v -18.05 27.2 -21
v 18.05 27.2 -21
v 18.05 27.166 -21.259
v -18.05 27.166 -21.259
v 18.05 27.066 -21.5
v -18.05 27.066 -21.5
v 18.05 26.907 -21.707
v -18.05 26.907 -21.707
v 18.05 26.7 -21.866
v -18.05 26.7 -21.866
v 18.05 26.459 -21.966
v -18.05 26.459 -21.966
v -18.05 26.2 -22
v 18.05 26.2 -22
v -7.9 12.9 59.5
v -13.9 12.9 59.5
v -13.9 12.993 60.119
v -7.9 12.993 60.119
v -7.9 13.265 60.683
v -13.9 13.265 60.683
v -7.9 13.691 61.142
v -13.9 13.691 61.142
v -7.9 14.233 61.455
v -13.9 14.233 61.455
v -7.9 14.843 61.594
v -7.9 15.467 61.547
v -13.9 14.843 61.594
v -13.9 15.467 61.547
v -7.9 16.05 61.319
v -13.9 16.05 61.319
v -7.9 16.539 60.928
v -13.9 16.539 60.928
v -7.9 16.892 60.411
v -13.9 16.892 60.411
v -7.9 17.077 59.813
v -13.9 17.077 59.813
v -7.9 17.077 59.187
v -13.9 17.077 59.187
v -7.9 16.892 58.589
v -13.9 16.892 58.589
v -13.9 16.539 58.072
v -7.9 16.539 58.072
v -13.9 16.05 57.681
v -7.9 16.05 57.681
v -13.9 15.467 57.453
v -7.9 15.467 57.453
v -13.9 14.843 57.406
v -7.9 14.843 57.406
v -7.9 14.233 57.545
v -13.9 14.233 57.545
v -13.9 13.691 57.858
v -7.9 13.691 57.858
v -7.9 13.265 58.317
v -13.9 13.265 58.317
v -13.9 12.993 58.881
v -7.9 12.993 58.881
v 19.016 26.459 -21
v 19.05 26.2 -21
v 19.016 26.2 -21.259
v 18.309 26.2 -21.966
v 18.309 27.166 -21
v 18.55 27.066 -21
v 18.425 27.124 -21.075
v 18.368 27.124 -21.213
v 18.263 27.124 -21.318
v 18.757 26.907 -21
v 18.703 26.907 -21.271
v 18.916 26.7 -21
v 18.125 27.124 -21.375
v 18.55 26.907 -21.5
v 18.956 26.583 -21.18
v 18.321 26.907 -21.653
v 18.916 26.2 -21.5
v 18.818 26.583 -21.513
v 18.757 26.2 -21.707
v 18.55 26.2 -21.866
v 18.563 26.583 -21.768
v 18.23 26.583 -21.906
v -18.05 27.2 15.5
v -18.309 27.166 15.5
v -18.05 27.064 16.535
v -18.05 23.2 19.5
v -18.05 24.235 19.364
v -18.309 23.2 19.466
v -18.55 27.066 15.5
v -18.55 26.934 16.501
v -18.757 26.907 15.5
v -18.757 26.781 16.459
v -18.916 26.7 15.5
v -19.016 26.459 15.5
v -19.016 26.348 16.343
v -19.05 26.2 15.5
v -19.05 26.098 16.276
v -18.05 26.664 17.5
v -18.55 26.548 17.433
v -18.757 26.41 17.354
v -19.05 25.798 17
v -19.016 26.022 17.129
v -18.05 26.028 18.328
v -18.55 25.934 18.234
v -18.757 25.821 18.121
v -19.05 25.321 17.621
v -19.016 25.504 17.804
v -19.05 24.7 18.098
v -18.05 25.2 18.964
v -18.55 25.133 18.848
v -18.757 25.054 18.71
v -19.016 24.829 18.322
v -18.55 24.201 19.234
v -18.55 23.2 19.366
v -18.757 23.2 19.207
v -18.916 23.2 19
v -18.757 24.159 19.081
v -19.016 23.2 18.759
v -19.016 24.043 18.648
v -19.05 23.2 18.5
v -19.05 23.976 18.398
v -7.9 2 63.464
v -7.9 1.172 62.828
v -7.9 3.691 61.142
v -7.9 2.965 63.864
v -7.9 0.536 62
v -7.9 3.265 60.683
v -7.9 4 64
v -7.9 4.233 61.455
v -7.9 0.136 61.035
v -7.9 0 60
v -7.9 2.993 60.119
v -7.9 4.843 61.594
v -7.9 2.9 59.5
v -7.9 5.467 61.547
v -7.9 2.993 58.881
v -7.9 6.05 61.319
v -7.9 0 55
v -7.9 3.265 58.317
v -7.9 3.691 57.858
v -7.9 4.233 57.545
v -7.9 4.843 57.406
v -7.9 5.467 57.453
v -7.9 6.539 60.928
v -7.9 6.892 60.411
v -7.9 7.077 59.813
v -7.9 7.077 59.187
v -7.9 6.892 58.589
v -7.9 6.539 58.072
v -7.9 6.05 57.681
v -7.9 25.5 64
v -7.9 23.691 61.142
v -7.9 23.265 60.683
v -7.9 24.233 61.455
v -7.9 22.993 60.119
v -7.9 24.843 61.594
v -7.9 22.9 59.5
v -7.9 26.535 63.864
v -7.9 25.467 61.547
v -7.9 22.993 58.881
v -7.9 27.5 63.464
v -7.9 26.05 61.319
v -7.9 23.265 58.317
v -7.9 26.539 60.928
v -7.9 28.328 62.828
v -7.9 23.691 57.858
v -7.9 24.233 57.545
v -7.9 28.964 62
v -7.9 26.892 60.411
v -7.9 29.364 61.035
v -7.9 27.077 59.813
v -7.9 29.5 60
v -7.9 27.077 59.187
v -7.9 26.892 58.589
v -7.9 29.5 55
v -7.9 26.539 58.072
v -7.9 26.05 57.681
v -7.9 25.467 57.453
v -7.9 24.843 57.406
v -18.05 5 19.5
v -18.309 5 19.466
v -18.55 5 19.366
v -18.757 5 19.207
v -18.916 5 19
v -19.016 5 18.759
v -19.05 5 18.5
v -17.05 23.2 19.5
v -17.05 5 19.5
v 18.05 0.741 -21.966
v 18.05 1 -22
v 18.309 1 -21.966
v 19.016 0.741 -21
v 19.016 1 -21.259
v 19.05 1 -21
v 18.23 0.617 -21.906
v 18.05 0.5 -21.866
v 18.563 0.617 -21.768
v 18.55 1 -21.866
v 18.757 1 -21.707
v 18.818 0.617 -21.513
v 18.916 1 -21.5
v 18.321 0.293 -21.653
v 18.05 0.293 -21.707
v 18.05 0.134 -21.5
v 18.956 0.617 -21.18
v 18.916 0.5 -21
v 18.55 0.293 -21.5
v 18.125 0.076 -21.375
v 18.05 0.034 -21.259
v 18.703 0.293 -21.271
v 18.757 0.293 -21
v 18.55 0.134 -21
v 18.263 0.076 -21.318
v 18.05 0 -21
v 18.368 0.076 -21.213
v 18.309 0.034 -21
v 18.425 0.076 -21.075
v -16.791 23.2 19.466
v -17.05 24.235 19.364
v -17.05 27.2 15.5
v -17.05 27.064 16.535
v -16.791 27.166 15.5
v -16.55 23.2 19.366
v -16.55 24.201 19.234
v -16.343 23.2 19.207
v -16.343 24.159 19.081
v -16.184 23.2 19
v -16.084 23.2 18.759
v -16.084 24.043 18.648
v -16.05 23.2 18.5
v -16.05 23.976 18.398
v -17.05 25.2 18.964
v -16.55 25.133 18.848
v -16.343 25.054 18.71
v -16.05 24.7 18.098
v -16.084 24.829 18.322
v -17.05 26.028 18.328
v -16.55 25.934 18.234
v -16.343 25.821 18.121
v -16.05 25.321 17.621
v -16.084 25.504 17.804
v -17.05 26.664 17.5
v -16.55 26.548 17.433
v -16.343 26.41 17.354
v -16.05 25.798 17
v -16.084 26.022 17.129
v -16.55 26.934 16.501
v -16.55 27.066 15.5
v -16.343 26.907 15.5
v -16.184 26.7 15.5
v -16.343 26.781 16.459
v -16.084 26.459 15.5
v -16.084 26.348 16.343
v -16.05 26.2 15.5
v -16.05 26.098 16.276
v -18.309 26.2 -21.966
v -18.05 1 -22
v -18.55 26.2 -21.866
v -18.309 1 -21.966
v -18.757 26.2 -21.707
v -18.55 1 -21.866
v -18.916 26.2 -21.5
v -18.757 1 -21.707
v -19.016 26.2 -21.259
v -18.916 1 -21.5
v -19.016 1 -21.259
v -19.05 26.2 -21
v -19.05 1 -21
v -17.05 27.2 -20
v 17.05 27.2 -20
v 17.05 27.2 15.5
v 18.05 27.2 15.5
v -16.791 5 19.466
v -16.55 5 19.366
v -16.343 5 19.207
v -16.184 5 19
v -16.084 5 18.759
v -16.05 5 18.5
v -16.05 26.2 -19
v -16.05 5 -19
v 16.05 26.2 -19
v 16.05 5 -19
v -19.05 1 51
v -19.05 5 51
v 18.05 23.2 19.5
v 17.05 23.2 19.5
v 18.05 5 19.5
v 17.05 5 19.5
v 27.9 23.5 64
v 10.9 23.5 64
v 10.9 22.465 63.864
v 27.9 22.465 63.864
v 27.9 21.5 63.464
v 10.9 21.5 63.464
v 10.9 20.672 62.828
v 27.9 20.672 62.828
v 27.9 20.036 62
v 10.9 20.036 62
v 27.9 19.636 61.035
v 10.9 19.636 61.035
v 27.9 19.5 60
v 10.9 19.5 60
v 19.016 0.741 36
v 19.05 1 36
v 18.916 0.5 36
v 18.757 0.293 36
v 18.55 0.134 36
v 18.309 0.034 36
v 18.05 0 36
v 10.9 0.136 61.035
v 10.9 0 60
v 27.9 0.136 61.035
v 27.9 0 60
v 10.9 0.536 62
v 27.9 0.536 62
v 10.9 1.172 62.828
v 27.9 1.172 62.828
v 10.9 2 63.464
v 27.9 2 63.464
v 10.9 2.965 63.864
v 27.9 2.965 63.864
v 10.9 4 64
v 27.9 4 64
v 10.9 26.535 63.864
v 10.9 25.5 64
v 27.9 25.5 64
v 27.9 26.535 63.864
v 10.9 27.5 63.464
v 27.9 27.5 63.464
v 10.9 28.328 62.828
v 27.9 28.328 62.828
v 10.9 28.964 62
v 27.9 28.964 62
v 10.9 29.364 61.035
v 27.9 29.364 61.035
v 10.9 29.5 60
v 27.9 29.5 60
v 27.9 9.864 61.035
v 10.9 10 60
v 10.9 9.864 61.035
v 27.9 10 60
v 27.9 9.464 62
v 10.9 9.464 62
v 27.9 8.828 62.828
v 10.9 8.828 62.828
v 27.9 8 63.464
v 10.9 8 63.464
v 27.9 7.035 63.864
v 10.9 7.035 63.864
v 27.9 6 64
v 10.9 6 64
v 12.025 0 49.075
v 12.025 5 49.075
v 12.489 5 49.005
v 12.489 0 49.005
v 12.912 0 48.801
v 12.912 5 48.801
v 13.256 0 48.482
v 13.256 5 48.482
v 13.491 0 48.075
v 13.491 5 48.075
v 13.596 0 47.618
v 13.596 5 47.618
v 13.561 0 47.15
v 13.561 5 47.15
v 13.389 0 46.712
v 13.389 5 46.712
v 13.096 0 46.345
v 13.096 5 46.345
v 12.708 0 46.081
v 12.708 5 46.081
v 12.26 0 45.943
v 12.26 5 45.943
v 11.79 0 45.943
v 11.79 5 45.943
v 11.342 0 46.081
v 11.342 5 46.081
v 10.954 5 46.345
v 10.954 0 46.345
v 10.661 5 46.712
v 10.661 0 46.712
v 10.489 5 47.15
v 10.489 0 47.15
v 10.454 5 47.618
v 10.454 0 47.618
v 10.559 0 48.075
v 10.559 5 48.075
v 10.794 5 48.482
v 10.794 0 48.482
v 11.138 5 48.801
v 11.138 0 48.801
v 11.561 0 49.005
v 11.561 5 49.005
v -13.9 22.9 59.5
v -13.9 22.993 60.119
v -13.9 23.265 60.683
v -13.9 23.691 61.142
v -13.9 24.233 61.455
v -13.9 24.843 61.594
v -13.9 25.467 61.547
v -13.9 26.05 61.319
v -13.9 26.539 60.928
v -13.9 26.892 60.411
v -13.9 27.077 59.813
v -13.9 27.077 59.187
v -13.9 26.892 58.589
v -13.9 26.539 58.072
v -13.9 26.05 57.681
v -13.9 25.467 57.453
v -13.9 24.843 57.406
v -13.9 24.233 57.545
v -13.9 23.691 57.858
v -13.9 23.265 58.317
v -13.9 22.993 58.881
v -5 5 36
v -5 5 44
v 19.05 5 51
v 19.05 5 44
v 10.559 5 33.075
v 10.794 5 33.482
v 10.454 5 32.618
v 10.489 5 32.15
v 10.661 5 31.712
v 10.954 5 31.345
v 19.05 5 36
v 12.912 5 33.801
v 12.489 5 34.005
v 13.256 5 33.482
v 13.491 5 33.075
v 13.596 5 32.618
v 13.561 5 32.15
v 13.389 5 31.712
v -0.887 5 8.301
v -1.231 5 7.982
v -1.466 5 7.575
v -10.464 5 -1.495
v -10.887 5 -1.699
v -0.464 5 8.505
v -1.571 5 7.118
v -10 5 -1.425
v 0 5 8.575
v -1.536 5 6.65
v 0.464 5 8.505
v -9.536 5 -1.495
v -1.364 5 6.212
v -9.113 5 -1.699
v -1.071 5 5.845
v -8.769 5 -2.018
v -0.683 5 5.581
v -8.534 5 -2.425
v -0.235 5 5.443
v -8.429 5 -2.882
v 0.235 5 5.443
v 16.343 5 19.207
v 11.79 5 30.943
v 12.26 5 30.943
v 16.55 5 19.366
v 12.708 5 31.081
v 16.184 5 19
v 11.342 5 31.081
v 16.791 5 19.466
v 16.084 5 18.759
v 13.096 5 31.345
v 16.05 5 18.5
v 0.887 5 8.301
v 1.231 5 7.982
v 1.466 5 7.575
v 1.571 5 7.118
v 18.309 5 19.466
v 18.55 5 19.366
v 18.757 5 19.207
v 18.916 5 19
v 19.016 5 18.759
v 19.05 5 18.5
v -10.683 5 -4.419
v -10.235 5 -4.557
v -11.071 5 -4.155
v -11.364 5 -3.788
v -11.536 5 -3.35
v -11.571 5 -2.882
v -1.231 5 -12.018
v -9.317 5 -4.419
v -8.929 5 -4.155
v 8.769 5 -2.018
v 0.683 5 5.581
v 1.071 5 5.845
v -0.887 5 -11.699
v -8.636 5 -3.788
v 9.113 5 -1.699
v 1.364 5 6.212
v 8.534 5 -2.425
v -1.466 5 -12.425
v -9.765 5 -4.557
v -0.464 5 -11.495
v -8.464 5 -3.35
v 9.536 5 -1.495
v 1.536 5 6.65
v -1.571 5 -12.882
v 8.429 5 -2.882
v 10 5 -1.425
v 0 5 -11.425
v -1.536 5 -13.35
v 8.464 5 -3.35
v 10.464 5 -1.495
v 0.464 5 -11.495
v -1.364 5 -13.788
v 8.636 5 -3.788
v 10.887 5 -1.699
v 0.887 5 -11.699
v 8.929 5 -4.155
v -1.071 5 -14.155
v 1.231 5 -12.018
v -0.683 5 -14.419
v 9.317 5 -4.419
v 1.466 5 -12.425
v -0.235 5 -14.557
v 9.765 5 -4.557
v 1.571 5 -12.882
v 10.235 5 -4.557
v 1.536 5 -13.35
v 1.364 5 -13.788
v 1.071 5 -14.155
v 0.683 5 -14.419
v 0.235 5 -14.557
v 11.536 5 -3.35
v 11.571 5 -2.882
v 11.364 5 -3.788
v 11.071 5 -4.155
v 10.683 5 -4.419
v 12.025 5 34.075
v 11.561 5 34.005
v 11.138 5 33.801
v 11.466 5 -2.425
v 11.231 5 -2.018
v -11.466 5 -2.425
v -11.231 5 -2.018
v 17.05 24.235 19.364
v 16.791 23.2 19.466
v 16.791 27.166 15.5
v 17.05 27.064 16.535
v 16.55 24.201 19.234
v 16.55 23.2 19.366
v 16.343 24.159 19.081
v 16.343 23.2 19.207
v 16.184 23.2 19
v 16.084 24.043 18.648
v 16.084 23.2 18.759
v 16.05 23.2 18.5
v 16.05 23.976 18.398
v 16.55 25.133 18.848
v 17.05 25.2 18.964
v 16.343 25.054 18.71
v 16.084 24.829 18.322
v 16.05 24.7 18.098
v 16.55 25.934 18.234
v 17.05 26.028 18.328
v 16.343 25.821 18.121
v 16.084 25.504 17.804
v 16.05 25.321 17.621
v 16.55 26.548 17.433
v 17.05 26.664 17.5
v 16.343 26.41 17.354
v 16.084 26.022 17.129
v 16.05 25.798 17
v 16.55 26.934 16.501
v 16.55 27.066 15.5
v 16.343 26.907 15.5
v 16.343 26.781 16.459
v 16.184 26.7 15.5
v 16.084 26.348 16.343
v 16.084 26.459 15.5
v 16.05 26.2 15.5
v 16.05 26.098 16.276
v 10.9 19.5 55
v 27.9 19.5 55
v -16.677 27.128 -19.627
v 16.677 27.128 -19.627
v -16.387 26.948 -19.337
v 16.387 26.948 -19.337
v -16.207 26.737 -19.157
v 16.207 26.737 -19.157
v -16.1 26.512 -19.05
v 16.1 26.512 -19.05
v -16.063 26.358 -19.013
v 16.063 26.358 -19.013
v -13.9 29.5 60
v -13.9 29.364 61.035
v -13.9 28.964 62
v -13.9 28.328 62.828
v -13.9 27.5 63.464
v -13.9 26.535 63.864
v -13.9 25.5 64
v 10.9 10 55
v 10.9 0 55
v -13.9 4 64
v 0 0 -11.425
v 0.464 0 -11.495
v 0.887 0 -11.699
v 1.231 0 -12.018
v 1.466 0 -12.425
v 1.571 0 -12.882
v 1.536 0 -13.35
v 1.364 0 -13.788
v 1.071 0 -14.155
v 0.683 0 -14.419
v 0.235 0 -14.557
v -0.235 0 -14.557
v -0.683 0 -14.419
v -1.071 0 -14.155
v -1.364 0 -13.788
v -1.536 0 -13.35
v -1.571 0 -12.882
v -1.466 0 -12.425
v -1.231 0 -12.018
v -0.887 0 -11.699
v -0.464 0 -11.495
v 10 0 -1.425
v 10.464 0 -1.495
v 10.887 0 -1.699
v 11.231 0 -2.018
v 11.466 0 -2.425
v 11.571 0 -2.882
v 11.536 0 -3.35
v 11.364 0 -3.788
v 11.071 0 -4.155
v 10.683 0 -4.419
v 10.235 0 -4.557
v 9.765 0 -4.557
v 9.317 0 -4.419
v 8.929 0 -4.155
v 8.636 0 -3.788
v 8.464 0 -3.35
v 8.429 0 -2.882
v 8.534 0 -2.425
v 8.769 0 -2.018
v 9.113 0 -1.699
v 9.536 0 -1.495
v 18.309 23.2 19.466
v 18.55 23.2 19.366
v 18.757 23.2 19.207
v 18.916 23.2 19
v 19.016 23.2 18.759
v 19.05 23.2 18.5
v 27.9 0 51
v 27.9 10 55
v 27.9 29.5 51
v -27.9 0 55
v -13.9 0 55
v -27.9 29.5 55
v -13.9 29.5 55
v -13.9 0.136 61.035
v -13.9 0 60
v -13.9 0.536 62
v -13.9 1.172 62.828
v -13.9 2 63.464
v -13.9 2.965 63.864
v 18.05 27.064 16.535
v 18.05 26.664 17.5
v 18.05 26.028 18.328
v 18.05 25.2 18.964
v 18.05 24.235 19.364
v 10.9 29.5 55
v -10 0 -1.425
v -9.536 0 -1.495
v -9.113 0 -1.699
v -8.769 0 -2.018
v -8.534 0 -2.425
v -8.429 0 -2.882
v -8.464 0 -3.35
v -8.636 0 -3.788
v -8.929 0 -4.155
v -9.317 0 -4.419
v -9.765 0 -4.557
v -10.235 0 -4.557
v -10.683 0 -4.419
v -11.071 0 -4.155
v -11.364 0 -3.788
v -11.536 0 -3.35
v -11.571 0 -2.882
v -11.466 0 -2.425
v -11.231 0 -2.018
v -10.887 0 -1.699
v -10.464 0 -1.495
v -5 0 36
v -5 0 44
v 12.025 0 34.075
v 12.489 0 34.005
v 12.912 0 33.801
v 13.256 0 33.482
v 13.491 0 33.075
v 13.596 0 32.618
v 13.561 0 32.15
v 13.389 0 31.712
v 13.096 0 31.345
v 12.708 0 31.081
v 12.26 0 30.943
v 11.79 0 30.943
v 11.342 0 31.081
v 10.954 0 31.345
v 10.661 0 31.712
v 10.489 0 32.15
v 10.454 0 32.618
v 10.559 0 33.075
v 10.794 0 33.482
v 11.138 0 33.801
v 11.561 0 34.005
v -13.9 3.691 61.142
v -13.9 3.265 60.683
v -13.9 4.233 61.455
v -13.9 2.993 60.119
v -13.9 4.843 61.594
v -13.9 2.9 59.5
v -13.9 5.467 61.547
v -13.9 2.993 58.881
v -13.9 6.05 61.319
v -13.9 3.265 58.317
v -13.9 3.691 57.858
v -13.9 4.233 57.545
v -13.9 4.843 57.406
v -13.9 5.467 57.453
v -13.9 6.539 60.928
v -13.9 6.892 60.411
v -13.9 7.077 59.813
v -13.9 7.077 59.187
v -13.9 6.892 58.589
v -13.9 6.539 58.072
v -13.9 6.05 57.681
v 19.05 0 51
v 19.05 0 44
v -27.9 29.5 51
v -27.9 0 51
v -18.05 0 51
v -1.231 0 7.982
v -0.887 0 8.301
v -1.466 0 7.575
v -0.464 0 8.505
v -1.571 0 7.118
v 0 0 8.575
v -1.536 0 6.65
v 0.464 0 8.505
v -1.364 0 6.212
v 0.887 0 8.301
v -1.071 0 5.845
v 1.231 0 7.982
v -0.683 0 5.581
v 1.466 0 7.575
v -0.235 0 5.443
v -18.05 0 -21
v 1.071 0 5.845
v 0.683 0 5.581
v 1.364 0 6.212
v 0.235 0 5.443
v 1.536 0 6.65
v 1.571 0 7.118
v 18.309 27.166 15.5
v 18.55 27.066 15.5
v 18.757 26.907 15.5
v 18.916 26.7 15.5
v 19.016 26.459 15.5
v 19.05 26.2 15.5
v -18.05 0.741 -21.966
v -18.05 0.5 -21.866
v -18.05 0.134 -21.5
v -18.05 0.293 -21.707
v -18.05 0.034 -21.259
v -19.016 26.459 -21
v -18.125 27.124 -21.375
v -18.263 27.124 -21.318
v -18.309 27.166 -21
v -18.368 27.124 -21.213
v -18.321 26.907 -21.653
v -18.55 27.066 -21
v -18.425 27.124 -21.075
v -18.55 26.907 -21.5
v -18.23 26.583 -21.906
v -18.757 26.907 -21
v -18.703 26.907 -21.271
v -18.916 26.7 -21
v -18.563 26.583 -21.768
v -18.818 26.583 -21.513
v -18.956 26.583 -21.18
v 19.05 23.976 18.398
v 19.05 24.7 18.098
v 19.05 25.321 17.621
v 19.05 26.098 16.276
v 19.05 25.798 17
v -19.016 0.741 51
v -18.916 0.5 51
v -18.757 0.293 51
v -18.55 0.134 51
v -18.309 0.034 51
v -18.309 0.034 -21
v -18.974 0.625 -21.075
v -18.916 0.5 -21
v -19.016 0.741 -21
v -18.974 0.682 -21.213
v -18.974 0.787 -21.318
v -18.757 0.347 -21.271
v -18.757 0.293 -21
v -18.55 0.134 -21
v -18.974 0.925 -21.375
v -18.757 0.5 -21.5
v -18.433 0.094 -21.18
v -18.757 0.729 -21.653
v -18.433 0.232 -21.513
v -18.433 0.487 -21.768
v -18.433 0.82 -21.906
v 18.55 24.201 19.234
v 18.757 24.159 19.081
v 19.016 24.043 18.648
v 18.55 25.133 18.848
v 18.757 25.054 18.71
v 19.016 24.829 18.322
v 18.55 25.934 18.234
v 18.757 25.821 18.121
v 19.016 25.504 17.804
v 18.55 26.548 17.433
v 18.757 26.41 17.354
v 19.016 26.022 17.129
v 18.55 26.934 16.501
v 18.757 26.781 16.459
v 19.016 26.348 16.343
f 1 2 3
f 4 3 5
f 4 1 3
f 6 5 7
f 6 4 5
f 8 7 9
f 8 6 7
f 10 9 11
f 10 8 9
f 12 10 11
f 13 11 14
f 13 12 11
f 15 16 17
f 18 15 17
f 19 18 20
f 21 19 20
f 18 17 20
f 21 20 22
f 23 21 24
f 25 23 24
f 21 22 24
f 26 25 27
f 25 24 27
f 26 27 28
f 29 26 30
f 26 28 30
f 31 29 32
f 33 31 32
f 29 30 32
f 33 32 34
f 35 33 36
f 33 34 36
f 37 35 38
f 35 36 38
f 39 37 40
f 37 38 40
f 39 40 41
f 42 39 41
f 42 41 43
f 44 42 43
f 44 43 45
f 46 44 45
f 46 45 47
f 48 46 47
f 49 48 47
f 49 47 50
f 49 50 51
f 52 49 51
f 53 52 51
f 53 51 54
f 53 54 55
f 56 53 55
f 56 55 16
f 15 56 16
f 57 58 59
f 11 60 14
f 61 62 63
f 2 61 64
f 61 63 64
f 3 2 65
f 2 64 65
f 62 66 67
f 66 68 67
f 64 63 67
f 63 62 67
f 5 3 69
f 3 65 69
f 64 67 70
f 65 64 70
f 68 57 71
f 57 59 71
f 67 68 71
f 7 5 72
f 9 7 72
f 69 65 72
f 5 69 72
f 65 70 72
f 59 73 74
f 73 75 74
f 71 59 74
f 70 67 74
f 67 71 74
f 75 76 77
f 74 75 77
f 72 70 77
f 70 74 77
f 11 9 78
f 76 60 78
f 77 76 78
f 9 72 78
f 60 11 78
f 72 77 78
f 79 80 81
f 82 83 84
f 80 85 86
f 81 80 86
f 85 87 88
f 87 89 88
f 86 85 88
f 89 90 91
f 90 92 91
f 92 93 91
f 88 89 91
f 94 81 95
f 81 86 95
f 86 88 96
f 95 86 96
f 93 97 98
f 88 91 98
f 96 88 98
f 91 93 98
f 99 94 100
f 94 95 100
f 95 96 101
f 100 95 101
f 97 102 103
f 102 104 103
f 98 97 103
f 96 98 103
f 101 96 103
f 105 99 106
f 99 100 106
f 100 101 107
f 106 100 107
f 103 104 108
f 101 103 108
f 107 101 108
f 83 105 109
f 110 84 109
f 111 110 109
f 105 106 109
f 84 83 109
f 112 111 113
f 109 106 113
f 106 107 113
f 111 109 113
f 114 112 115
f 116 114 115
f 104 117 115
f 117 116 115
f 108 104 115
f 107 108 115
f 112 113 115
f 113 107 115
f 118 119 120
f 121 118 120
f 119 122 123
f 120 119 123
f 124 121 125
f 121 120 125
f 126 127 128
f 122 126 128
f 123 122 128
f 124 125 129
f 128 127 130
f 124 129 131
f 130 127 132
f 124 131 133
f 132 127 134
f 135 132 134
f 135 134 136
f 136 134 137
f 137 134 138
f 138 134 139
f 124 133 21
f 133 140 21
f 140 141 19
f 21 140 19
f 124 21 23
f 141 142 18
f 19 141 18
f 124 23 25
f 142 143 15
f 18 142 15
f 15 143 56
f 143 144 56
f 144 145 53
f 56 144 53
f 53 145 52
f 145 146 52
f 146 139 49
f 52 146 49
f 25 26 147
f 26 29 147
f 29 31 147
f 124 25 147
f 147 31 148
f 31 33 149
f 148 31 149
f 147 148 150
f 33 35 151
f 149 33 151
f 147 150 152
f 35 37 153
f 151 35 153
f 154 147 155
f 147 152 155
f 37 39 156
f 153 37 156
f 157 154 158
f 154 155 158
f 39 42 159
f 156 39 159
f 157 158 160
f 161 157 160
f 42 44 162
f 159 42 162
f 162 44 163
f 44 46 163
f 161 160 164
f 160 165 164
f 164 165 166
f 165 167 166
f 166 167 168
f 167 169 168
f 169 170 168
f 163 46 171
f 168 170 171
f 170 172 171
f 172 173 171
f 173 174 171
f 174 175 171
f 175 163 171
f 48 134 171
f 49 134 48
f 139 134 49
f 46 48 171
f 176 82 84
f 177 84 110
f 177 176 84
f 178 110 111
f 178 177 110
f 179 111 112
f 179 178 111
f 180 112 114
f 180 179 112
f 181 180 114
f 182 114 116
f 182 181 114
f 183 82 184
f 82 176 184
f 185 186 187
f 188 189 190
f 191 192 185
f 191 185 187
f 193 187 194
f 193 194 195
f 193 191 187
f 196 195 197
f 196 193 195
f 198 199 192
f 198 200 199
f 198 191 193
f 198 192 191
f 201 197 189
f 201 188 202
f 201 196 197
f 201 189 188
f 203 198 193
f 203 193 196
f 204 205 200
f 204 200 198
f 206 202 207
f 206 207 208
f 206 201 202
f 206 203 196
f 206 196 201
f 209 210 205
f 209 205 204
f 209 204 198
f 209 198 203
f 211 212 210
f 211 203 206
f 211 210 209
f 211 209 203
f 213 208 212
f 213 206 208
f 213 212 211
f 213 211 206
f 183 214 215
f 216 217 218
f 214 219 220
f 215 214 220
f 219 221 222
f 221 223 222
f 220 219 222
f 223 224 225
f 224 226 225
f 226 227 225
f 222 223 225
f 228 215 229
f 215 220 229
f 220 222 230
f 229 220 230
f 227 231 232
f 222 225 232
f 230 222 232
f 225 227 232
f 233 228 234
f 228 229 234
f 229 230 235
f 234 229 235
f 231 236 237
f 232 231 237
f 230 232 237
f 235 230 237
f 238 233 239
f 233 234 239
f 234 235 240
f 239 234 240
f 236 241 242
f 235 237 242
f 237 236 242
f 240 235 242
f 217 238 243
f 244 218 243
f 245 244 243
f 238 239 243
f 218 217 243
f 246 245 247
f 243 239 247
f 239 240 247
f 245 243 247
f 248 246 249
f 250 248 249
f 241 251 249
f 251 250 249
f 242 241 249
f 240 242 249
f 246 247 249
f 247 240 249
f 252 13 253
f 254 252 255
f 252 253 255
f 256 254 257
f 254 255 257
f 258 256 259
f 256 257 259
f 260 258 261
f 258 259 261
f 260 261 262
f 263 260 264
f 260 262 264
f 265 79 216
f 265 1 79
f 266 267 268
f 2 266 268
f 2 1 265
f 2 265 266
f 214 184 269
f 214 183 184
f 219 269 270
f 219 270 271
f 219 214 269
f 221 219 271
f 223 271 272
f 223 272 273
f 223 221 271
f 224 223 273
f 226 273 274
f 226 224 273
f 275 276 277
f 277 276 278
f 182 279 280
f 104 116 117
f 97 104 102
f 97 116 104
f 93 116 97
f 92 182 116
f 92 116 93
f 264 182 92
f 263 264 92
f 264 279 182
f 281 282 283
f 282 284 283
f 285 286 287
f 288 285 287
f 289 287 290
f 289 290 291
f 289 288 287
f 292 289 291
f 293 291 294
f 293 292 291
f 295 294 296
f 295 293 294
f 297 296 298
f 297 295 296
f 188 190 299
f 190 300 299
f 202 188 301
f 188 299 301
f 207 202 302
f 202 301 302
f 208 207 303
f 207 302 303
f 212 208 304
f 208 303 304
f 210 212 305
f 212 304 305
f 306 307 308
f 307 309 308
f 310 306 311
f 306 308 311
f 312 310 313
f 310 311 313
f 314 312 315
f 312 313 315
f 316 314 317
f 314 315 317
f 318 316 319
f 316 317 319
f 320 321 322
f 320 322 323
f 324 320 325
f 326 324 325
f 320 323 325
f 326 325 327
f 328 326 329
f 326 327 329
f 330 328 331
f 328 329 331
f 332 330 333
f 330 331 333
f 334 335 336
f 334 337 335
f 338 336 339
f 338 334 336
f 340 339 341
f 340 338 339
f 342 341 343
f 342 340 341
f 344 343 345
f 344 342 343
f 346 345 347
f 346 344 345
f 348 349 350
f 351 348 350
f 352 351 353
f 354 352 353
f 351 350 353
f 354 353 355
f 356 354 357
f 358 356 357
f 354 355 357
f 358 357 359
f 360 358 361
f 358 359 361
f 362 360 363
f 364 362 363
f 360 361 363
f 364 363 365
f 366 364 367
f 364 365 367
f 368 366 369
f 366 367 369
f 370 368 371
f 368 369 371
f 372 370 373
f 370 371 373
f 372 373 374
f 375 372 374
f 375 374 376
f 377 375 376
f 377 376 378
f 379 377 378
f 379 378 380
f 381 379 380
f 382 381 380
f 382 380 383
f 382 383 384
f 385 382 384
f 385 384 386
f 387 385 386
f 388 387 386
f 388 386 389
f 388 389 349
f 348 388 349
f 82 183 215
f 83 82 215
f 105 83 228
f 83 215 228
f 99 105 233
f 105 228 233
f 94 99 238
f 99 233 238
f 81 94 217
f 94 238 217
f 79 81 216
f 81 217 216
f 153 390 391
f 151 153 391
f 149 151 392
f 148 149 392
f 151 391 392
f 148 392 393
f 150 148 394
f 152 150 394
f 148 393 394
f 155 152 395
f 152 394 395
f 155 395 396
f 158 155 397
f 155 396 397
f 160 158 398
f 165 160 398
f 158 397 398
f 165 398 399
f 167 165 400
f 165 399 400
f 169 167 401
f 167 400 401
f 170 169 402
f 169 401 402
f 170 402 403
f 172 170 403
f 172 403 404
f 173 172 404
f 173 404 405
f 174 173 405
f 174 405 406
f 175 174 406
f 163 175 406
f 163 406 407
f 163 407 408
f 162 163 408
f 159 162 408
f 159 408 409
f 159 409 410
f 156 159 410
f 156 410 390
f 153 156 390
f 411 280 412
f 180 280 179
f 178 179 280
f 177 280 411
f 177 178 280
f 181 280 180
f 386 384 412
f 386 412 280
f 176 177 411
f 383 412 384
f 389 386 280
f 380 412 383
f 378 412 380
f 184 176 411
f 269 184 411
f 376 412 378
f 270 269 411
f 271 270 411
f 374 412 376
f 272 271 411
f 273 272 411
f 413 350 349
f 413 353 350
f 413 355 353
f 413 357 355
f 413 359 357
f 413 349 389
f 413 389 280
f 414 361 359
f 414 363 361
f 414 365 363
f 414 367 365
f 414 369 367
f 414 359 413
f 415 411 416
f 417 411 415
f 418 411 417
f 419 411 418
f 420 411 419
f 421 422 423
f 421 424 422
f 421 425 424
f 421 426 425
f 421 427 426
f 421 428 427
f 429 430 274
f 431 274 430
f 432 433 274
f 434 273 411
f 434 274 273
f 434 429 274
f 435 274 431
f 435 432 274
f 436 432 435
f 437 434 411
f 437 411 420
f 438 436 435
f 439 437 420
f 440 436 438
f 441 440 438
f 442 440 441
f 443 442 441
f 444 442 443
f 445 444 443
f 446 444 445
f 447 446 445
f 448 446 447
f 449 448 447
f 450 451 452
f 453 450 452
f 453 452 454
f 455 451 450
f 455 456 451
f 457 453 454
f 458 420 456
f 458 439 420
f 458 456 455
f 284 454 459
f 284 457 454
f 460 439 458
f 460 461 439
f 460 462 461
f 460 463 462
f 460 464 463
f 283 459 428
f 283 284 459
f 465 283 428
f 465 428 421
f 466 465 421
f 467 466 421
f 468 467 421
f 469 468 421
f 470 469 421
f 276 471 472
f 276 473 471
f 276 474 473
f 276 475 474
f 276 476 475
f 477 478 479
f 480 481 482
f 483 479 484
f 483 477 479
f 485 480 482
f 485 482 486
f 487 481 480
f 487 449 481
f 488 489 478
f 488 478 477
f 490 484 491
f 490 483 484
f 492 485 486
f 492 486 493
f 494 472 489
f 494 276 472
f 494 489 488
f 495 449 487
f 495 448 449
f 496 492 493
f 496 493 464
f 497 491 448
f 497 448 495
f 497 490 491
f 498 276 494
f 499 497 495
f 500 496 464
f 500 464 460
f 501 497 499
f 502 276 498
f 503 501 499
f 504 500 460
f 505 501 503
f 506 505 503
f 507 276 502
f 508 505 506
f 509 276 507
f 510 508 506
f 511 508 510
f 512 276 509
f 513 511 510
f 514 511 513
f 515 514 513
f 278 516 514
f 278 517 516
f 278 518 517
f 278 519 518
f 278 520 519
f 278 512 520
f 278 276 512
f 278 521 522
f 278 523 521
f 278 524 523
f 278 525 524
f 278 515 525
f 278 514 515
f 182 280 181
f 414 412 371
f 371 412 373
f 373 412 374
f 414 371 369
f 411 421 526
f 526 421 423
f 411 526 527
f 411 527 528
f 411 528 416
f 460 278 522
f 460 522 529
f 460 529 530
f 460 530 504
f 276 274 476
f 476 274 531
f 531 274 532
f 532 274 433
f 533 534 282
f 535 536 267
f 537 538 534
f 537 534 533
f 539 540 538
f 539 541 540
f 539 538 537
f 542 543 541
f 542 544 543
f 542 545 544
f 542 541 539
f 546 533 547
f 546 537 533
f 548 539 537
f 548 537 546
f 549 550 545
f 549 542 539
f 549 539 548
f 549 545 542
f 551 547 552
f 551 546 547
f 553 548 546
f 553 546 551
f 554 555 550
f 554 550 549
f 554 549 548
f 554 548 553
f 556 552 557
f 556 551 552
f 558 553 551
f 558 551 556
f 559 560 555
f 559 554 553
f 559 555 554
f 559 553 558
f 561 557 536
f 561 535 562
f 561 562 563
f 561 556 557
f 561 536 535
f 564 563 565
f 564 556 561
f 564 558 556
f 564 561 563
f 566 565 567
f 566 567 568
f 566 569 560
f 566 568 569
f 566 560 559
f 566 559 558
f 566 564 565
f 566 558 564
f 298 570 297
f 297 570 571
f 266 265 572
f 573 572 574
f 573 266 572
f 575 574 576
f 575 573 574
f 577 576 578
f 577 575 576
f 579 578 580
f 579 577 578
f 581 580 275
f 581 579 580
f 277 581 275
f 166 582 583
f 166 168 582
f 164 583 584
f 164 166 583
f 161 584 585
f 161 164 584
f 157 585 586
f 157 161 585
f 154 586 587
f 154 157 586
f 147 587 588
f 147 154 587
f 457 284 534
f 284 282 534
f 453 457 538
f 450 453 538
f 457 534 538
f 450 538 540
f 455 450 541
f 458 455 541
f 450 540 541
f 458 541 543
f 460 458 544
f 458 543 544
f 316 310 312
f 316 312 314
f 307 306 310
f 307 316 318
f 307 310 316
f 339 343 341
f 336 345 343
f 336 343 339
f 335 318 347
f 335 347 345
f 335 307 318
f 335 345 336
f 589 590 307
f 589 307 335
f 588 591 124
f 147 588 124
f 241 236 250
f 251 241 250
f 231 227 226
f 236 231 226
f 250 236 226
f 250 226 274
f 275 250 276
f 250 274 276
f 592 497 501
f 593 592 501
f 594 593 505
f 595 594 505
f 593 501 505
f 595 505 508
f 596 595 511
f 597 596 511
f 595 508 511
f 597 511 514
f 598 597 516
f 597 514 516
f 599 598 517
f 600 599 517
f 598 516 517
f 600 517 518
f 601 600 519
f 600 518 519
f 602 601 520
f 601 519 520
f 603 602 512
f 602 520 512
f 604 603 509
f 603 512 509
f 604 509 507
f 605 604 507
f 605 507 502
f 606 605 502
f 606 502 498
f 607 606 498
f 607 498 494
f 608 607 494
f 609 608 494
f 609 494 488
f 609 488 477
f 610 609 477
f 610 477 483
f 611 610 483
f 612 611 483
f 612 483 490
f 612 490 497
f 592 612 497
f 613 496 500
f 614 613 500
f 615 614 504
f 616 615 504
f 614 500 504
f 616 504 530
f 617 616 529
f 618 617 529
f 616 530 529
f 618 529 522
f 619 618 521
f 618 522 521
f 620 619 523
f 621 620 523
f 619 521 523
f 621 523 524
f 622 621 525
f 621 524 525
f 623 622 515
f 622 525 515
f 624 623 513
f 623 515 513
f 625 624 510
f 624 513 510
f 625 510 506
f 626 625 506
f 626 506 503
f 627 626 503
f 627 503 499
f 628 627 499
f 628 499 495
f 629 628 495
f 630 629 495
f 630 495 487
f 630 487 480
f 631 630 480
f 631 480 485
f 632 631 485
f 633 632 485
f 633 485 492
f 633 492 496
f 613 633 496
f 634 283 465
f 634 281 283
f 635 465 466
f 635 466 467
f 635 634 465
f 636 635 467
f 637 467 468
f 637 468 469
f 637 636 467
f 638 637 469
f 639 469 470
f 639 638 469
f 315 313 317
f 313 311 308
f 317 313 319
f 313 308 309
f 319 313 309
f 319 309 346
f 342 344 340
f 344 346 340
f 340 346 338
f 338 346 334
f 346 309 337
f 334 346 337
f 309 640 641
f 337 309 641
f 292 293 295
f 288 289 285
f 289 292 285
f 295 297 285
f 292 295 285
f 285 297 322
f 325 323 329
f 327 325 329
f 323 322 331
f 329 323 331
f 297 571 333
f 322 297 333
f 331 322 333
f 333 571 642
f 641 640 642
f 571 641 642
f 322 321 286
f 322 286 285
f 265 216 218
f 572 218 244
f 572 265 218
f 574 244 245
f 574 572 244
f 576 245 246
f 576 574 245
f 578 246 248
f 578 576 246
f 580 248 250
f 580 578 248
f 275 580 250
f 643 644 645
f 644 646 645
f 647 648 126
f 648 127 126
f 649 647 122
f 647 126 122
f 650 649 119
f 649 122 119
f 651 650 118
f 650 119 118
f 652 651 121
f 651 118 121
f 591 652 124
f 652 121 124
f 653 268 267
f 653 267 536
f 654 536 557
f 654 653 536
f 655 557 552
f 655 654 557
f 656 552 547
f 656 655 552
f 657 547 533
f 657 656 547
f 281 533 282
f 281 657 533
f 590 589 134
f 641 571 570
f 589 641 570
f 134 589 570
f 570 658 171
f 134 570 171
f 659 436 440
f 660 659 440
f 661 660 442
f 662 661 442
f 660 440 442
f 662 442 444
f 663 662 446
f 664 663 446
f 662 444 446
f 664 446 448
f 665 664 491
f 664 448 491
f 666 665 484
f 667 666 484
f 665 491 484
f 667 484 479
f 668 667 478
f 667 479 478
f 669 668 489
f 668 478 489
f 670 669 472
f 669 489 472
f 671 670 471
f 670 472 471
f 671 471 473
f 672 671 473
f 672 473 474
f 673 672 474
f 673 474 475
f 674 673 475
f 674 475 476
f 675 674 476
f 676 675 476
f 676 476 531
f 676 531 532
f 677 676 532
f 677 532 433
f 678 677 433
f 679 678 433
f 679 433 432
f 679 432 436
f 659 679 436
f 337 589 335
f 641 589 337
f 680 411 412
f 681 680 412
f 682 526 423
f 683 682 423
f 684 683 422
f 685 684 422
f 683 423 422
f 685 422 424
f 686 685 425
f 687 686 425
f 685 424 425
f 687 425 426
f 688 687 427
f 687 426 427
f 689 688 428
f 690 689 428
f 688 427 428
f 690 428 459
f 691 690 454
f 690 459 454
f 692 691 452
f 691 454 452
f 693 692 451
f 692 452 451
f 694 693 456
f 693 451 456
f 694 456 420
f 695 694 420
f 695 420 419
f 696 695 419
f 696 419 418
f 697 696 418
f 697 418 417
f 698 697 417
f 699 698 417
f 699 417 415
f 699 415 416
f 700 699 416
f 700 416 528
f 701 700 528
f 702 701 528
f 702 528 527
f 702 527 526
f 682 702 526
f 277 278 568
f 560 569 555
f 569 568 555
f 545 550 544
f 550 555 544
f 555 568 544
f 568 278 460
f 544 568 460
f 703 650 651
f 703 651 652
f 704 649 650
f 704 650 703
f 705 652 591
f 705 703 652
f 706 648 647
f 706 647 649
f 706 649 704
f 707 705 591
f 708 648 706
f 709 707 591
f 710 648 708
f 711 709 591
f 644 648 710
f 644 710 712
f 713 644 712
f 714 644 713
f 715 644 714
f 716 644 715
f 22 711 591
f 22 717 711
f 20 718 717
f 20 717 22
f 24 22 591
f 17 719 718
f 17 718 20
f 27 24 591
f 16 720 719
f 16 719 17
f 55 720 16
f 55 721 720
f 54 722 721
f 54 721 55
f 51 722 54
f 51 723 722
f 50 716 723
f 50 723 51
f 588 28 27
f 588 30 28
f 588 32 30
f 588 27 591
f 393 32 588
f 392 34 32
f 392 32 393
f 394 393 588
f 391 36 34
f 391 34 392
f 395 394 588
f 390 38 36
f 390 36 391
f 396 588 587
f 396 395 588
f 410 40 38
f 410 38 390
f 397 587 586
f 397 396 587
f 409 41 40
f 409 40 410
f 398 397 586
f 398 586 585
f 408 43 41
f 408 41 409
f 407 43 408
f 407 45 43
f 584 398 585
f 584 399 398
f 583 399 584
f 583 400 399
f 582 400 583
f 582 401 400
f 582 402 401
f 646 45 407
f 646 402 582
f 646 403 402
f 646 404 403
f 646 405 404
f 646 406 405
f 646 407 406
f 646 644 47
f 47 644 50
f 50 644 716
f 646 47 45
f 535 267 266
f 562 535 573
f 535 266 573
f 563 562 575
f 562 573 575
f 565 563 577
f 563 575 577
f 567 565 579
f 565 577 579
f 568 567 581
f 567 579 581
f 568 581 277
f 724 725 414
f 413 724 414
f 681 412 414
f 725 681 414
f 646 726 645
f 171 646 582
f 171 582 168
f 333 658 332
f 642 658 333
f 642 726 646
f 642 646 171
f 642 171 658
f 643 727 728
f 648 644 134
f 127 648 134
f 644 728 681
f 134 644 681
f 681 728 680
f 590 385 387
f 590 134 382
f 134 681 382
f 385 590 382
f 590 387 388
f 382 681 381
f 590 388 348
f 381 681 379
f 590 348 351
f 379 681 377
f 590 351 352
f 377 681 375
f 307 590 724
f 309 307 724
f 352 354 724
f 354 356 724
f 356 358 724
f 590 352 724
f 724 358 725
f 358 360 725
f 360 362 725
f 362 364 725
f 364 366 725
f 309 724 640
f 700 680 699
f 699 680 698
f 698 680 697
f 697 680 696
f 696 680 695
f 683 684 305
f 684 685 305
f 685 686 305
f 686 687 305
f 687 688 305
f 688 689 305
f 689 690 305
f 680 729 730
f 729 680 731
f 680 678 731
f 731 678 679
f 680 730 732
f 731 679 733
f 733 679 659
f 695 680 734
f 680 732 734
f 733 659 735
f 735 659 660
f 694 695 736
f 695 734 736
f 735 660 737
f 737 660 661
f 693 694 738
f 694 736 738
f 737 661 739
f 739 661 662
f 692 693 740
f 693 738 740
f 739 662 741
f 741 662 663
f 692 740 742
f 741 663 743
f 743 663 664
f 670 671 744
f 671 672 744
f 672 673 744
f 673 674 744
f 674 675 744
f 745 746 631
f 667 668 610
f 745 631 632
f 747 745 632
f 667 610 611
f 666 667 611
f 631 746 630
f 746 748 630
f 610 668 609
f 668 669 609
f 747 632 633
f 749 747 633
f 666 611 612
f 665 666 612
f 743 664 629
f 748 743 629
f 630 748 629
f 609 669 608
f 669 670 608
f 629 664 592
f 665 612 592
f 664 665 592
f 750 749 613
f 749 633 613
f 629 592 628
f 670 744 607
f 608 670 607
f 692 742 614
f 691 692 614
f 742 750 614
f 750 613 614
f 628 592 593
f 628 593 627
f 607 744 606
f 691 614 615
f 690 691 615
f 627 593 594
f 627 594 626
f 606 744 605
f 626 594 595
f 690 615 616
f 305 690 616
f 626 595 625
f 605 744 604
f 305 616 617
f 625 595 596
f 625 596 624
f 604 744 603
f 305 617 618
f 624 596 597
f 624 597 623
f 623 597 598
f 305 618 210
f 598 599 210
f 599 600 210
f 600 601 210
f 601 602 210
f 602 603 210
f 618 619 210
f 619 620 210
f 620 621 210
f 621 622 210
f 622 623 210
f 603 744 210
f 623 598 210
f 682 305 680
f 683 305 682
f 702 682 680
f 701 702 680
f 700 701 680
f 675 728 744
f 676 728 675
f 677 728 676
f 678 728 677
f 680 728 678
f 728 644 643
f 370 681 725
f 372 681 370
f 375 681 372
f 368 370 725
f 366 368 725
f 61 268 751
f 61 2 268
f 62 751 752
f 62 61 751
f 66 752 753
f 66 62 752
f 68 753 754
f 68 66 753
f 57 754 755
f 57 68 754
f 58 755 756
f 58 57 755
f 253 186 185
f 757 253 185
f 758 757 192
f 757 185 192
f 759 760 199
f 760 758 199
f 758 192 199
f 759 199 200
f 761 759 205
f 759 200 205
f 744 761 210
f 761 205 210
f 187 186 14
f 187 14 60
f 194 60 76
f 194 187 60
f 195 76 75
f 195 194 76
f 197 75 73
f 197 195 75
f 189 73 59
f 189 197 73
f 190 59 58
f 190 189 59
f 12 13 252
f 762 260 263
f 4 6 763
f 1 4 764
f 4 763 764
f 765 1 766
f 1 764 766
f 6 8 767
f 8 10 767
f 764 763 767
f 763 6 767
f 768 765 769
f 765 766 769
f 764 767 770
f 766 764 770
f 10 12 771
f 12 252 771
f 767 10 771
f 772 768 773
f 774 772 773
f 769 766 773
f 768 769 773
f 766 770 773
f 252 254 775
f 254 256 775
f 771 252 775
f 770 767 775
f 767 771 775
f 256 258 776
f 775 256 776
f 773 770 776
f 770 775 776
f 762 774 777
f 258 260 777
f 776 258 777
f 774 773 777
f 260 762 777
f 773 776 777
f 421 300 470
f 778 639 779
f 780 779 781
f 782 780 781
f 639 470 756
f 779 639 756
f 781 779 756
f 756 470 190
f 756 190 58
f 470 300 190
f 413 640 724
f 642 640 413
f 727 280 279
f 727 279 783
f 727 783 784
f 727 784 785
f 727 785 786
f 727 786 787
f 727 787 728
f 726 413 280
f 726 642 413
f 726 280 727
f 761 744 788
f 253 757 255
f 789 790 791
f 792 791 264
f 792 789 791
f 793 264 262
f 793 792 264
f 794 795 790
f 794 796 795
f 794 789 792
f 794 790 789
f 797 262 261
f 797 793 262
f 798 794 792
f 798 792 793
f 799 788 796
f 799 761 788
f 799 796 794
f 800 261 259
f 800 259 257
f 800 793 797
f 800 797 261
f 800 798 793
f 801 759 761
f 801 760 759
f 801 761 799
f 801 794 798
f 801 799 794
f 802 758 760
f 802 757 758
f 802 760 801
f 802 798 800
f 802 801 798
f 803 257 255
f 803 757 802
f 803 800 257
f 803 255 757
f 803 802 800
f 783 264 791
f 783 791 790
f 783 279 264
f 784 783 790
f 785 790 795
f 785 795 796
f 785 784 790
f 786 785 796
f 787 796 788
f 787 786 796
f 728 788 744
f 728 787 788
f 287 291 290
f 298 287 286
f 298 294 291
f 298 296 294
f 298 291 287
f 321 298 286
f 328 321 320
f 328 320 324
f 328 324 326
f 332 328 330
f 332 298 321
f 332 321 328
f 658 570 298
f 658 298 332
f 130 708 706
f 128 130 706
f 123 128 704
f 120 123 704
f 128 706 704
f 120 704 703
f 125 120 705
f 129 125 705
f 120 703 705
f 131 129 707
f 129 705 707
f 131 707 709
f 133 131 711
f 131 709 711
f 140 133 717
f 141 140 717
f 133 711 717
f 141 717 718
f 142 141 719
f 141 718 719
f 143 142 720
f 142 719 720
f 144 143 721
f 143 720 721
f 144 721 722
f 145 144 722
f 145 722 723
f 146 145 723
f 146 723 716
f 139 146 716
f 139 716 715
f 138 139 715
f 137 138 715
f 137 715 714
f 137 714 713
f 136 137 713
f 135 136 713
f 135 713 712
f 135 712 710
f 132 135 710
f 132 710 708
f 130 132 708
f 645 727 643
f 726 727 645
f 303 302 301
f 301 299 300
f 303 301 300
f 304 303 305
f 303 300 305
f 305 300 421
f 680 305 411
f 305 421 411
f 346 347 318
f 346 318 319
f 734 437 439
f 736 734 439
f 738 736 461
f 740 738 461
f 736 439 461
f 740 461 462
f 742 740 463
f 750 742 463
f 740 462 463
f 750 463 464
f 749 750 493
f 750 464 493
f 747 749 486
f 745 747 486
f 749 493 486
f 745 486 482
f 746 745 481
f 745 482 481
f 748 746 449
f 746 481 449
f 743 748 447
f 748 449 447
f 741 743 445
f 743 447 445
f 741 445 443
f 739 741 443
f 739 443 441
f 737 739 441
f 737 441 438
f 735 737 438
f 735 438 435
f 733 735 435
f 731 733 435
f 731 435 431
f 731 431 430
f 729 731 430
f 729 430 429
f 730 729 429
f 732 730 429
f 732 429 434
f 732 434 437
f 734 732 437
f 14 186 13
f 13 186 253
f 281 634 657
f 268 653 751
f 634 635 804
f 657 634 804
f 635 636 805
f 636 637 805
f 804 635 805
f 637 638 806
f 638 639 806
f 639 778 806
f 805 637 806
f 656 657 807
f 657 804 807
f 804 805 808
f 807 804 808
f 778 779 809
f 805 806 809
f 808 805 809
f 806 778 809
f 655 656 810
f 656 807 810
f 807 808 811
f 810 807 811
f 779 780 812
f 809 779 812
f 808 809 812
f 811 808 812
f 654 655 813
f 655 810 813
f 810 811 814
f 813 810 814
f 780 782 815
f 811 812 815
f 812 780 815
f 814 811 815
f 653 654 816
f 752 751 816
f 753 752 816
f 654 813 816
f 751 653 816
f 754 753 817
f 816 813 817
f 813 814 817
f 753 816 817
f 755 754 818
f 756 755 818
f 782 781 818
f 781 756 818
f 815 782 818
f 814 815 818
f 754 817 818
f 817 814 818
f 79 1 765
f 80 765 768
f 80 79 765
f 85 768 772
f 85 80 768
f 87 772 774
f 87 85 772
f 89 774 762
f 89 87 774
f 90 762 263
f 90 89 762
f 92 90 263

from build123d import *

# Parameters (mm, degrees)
SKETCH_1_W          = 38.1
SKETCH_1_H          = 44
SENSOR_BASE_DEPTH   = 5
PROTECTOR_DEPTH     = 22.2
SKETCH_4_R          = 1.575
CUT_EXTRUDE_1_DEPTH = 37.602493084
SKETCH_5_W          = 38.1
SKETCH_5_H          = 5
EXTRUDE_3_DEPTH     = 29
EXTRUDE_4_DEPTH     = 4
SKETCH_9_W          = 6
SKETCH_9_H          = 29.5
EXTRUDE_5_DEPTH     = 9
SKETCH_10_W         = 17
SKETCH_10_H         = 10
EXTRUDE_6_DEPTH     = 9
FILLET_2_R          = 4
FILLET_3_R          = 4
FILLET_4_R          = 4
FILLET_5_R          = 4
FILLET_6_R          = 4
CUT_EXTRUDE_6_REACH = 83.936
SKETCH_26_R         = 2.1
SKETCH_30_W         = 14.05
SKETCH_30_H         = 8
CUT_EXTRUDE_7_DEPTH = 5
CUT_EXTRUDE_8_REACH = 75.991
SKETCH_31_R         = 1.575
FILLET_7_R          = 1
FILLET_8_R          = 1
FILLET_9_R          = 1


with BuildPart() as part:
    # 草图1 → Sensor_base (new body)
    with BuildSketch(Plane(origin=(0, 0, 0), x_dir=(1, 0, 0), z_dir=(0, 1, 0))):
        Rectangle(SKETCH_1_W, SKETCH_1_H)
    extrude(amount=SENSOR_BASE_DEPTH)

    # 草图2 → Protector (add)
    with BuildSketch(Plane(origin=(0, 5, 0), x_dir=(1, 0, 0), z_dir=(0, 1, 0))):
        Polygon((-19.05, 22), (-19.05, -19.5), (-16.05, -19.5), (-16.05, 19), (16.05, 19), (16.05, -19.5), (19.05, -19.5), (19.05, 18), (19.05, 22), align=None)
    extrude(amount=PROTECTOR_DEPTH)

    # 草图4 → 切除-拉伸1 (cut, through all)
    with BuildSketch(Plane(origin=(0, 5, 0), x_dir=(1, 0, 0), z_dir=(0, 1, 0))):
        with Locations(Location((0, 13, 0), (0, 0, 270))):
            Circle(SKETCH_4_R)
        with Locations(Location((-10, 3, 0), (0, 0, 270))):
            Circle(SKETCH_4_R)
        with Locations(Location((10, 3, 0), (0, 0, 270))):
            Circle(SKETCH_4_R)
        with Locations(Location((0, -7, 0), (0, 0, 270))):
            Circle(SKETCH_4_R)
    extrude(amount=-CUT_EXTRUDE_1_DEPTH, mode=Mode.SUBTRACT)

    # 草图5 → 凸台-拉伸3 (add)
    with BuildSketch(Plane.XY.offset(22)):
        with Locations((0, 2.5)):
            Rectangle(SKETCH_5_W, SKETCH_5_H)
    extrude(amount=EXTRUDE_3_DEPTH)

    # 草图8 → 凸台-拉伸4 (add)
    with BuildSketch(Plane.XY.offset(51)):
        Polygon((0, 0), (-27.9, 0), (-27.9, 29.5), (27.9, 29.5), (27.9, 0), align=None)
    extrude(amount=EXTRUDE_4_DEPTH)

    # 草图9 → 凸台-拉伸5 (add)
    with BuildSketch(Plane.XY.offset(55)):
        with Locations((-10.9, 14.75)):
            Rectangle(SKETCH_9_W, SKETCH_9_H)
    extrude(amount=EXTRUDE_5_DEPTH)

    # 草图10 → 凸台-拉伸6 (add)
    with BuildSketch(Plane.XY.offset(55)):
        with Locations((19.4, 24.5)):
            Rectangle(SKETCH_10_W, SKETCH_10_H)
        with Locations((19.4, 5)):
            Rectangle(SKETCH_10_W, SKETCH_10_H)
    extrude(amount=EXTRUDE_6_DEPTH)

    # 圆角2
    fillet_2_edges = [part.edges().sort_by_distance(p)[0] for p in [
        (19.4, 29.5, 64),
    ]]
    fillet(fillet_2_edges, radius=FILLET_2_R)

    # 圆角3
    fillet_3_edges = [part.edges().sort_by_distance(p)[0] for p in [
        (19.4, 19.5, 64),
    ]]
    fillet(fillet_3_edges, radius=FILLET_3_R)

    # 圆角4
    fillet_4_edges = [part.edges().sort_by_distance(p)[0] for p in [
        (19.4, 0, 64),
        (19.4, 10, 64),
    ]]
    fillet(fillet_4_edges, radius=FILLET_4_R)

    # 圆角5
    fillet_5_edges = [part.edges().sort_by_distance(p)[0] for p in [
        (-10.9, 0, 64),
        (-10.9, 29.5, 64),
    ]]
    fillet(fillet_5_edges, radius=FILLET_5_R)

    # 圆角6
    fillet_6_edges = [part.edges().sort_by_distance(p)[0] for p in [
        (-17.55, 27.2, 19.5),
        (17.55, 27.2, 19.5),
    ]]
    fillet(fillet_6_edges, radius=FILLET_6_R)

    # 草图26 → 切除-拉伸6 (cut, up to next)
    with BuildSketch(Plane.ZY.offset(13.9), mode=Mode.PRIVATE) as cut_extrude_6_sk1:
        with Locations(Location((59.5, 5, 0), (0, 0, 270))):
            Circle(SKETCH_26_R)
    cut_extrude_6_tool1 = extrude(cut_extrude_6_sk1.sketch, amount=-CUT_EXTRUDE_6_REACH, mode=Mode.PRIVATE) & part.part
    # 草图26 → 切除-拉伸6 (cut, up to next)
    with BuildSketch(Plane.ZY.offset(13.9), mode=Mode.PRIVATE) as cut_extrude_6_sk2:
        with Locations(Location((59.5, 15, 0), (0, 0, 270))):
            Circle(SKETCH_26_R)
    cut_extrude_6_tool2 = extrude(cut_extrude_6_sk2.sketch, amount=-CUT_EXTRUDE_6_REACH, mode=Mode.PRIVATE) & part.part
    # 草图26 → 切除-拉伸6 (cut, up to next)
    with BuildSketch(Plane.ZY.offset(13.9), mode=Mode.PRIVATE) as cut_extrude_6_sk3:
        with Locations(Location((59.5, 25, 0), (0, 0, 270))):
            Circle(SKETCH_26_R)
    cut_extrude_6_tool3 = extrude(cut_extrude_6_sk3.sketch, amount=-CUT_EXTRUDE_6_REACH, mode=Mode.PRIVATE) & part.part
    add(cut_extrude_6_tool1.solids().sort_by_distance((-13.9, 5, 59.5))[0], mode=Mode.SUBTRACT)
    add(cut_extrude_6_tool2.solids().sort_by_distance((-13.9, 15, 59.5))[0], mode=Mode.SUBTRACT)
    add(cut_extrude_6_tool3.solids().sort_by_distance((-13.9, 25, 59.5))[0], mode=Mode.SUBTRACT)

    # 草图30 → 切除-拉伸7 (cut)
    with BuildSketch(Plane(origin=(0, 5, 0), x_dir=(1, 0, 0), z_dir=(0, 1, 0))):
        Polygon((0, -44), (5, -44), (5, -36), (-5, -36), (-5, -44), align=None)
        with Locations((12.025, -40)):
            Rectangle(SKETCH_30_W, SKETCH_30_H)
    extrude(amount=-CUT_EXTRUDE_7_DEPTH, mode=Mode.SUBTRACT)

    # 草图31 → 切除-拉伸8 (cut, up to next)
    with BuildSketch(Plane(origin=(0, 5, 0), x_dir=(1, 0, 0), z_dir=(0, 1, 0)), mode=Mode.PRIVATE) as cut_extrude_8_sk1:
        with Locations(Location((12.025, -32.5, 0), (0, 0, 270))):
            Circle(SKETCH_31_R)
    cut_extrude_8_tool1 = extrude(cut_extrude_8_sk1.sketch, amount=-CUT_EXTRUDE_8_REACH, mode=Mode.PRIVATE) & part.part
    # 草图31 → 切除-拉伸8 (cut, up to next)
    with BuildSketch(Plane(origin=(0, 5, 0), x_dir=(1, 0, 0), z_dir=(0, 1, 0)), mode=Mode.PRIVATE) as cut_extrude_8_sk2:
        with Locations(Location((12.025, -47.5, 0), (0, 0, 270))):
            Circle(SKETCH_31_R)
    cut_extrude_8_tool2 = extrude(cut_extrude_8_sk2.sketch, amount=-CUT_EXTRUDE_8_REACH, mode=Mode.PRIVATE) & part.part
    add(cut_extrude_8_tool1.solids().sort_by_distance((12.025, 5, 32.5))[0], mode=Mode.SUBTRACT)
    add(cut_extrude_8_tool2.solids().sort_by_distance((12.025, 5, 47.5))[0], mode=Mode.SUBTRACT)

    # 圆角7
    fillet_7_edges = [part.edges().sort_by_distance(p)[0] for p in [
        (19.05, 13.6, -22),
    ]]
    fillet(fillet_7_edges, radius=FILLET_7_R)

    # 圆角8
    fillet_8_edges = [part.edges().sort_by_distance(p)[0] for p in [
        (19.05, 0, 7.5),
        (-0.5, 0, -22),
        (18.757106781, 0, -21.707106781),
        (-19.05, 0, 14.5),
        (-19.05, 13.6, -22),
    ]]
    fillet(fillet_8_edges, radius=FILLET_8_R)

    # 圆角9
    fillet_9_edges = [part.edges().sort_by_distance(p)[0] for p in [
        (-16.05, 27.2, -1.75),
        (19.05, 27.2, -2.75),
        (-16.05, 14.1, 19.5),
        (-16.05, 26.028427125, 18.328427125),
        (-19.05, 14.1, 19.5),
        (-19.05, 26.028427125, 18.328427125),
        (19.05, 14.1, 19.5),
        (19.05, 26.028427125, 18.328427125),
        (16.05, 14.1, 19.5),
        (16.05, 26.028427125, 18.328427125),
        (0, 27.2, -19),
        (16.05, 27.2, -1.75),
        (0, 27.2, -22),
        (18.757106781, 27.2, -21.707106781),
        (-19.05, 27.2, -2.75),
        (-18.757106781, 27.2, -21.707106781),
    ]]
    fillet(fillet_9_edges, radius=FILLET_9_R)


solid = part.part
